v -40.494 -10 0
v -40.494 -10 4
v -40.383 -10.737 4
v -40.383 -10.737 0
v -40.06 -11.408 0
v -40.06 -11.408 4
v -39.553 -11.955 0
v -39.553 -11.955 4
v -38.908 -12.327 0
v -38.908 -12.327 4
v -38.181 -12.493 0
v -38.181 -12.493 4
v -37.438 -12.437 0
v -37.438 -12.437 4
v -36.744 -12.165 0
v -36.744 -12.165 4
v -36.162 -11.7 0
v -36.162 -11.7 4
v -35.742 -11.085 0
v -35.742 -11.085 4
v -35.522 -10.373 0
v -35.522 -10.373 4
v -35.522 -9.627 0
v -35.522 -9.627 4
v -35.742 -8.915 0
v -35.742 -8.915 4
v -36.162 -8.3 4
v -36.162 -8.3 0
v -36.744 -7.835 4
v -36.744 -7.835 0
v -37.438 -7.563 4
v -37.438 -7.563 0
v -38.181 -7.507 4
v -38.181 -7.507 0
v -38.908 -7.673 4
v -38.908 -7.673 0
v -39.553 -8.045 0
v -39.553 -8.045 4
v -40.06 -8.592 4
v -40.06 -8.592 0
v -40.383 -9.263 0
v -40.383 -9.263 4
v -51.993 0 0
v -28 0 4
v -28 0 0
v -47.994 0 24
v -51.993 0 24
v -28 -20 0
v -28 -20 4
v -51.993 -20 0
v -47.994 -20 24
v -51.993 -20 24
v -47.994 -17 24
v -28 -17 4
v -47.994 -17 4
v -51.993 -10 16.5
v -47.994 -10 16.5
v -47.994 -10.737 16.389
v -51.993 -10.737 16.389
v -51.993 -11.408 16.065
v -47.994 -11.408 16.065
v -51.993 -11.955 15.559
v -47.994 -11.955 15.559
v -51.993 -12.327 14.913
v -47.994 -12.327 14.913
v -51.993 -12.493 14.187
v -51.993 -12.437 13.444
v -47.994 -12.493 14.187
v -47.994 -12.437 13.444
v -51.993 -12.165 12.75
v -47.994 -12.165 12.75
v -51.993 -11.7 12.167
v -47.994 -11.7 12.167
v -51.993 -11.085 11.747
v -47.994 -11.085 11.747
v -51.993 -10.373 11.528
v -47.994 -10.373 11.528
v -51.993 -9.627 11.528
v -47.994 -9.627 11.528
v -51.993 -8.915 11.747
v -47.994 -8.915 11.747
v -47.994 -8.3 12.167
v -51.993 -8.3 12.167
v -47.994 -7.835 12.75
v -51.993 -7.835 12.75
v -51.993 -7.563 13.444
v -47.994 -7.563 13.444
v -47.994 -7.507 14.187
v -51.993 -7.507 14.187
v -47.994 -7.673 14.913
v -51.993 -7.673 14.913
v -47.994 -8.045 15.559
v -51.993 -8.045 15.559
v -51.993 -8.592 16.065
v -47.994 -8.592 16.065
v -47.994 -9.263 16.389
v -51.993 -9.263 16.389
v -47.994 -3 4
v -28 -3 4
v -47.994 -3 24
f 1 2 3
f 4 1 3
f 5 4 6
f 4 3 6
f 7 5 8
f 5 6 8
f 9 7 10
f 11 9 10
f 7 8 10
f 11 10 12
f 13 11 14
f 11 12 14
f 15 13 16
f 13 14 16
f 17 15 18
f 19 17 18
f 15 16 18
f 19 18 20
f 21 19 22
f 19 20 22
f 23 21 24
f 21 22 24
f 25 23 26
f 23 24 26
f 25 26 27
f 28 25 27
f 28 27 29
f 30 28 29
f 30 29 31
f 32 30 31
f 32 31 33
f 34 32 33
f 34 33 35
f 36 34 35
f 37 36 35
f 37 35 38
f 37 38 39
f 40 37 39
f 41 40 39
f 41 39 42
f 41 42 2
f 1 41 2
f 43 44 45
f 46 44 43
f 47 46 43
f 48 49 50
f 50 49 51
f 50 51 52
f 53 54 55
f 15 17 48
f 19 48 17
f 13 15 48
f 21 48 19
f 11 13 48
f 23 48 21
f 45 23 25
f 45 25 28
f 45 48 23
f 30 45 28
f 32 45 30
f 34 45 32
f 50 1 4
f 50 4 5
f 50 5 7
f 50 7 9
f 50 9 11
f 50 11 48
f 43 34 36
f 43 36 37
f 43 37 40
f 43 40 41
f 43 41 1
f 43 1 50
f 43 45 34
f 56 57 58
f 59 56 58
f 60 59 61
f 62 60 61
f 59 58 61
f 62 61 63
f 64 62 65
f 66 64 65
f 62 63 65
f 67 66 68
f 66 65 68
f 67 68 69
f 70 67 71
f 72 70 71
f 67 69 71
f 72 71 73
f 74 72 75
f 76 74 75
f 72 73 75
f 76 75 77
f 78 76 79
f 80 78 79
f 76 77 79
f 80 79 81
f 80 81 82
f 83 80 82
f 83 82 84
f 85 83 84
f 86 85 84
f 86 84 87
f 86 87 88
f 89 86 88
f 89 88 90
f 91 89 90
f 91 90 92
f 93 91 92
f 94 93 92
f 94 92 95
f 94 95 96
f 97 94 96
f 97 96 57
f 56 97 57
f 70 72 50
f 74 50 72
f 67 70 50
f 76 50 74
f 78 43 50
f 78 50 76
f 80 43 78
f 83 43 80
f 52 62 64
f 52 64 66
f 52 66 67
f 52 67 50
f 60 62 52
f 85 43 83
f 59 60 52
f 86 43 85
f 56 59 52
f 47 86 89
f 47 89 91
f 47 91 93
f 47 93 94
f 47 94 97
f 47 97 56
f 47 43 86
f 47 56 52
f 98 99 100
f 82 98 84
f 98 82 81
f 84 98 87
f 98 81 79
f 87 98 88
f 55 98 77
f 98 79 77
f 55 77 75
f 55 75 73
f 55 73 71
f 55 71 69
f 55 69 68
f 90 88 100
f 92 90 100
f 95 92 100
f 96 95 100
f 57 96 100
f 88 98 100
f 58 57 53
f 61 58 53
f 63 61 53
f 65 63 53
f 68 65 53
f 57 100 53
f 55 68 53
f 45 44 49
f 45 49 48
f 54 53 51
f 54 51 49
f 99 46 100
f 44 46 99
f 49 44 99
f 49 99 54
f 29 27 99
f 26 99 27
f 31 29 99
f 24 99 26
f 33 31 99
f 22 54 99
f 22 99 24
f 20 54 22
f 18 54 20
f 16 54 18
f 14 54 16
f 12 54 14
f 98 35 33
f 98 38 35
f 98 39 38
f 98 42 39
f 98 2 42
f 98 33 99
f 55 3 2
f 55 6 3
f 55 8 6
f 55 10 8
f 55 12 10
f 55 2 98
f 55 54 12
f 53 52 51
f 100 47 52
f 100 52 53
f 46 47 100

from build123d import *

# Parameters (mm, degrees)
PAD_DEPTH       = 20
SKETCH001_W     = 19.994943
SKETCH001_H     = 14
POCKET_DEPTH    = 20
SKETCH002_R     = 2.5
POCKET001_DEPTH = 5
SKETCH003_R     = 2.5
POCKET002_DEPTH = 5


with BuildPart() as part:
    # Sketch → Pad (new body)
    with BuildSketch(Plane.XZ):
        Polygon((-51.993317, 0), (-51.993317, 24.000334), (-47.994495, 24.000334), (-27.999552, 3.999817), (-27.999552, 0), align=None)
    extrude(amount=PAD_DEPTH)

    # Sketch001 → Pocket (cut)
    with BuildSketch(Plane(origin=(0, 0, 24.000334), x_dir=(-1, 0, 0), z_dir=(0, 0, 1))):
        with Locations((37.9970235, 10)):
            Rectangle(SKETCH001_W, SKETCH001_H)
    extrude(amount=-POCKET_DEPTH, mode=Mode.SUBTRACT)

    # Sketch002 → Pocket001 (cut)
    with BuildSketch(Plane(origin=(-47.994495, 0, 0), x_dir=(0, 0, 1), z_dir=(1, 0, 0))):
        with Locations((13.999817, 10)):
            Circle(SKETCH002_R)
    extrude(amount=-POCKET001_DEPTH, mode=Mode.SUBTRACT)

    # Sketch003 → Pocket002 (cut)
    with BuildSketch(Plane(origin=(0, 0, 4.000334), x_dir=(-1, 0, 0), z_dir=(0, 0, 1))):
        with Locations((37.994495, 10)):
            Circle(SKETCH003_R)
    extrude(amount=-POCKET002_DEPTH, mode=Mode.SUBTRACT)


solid = part.part
